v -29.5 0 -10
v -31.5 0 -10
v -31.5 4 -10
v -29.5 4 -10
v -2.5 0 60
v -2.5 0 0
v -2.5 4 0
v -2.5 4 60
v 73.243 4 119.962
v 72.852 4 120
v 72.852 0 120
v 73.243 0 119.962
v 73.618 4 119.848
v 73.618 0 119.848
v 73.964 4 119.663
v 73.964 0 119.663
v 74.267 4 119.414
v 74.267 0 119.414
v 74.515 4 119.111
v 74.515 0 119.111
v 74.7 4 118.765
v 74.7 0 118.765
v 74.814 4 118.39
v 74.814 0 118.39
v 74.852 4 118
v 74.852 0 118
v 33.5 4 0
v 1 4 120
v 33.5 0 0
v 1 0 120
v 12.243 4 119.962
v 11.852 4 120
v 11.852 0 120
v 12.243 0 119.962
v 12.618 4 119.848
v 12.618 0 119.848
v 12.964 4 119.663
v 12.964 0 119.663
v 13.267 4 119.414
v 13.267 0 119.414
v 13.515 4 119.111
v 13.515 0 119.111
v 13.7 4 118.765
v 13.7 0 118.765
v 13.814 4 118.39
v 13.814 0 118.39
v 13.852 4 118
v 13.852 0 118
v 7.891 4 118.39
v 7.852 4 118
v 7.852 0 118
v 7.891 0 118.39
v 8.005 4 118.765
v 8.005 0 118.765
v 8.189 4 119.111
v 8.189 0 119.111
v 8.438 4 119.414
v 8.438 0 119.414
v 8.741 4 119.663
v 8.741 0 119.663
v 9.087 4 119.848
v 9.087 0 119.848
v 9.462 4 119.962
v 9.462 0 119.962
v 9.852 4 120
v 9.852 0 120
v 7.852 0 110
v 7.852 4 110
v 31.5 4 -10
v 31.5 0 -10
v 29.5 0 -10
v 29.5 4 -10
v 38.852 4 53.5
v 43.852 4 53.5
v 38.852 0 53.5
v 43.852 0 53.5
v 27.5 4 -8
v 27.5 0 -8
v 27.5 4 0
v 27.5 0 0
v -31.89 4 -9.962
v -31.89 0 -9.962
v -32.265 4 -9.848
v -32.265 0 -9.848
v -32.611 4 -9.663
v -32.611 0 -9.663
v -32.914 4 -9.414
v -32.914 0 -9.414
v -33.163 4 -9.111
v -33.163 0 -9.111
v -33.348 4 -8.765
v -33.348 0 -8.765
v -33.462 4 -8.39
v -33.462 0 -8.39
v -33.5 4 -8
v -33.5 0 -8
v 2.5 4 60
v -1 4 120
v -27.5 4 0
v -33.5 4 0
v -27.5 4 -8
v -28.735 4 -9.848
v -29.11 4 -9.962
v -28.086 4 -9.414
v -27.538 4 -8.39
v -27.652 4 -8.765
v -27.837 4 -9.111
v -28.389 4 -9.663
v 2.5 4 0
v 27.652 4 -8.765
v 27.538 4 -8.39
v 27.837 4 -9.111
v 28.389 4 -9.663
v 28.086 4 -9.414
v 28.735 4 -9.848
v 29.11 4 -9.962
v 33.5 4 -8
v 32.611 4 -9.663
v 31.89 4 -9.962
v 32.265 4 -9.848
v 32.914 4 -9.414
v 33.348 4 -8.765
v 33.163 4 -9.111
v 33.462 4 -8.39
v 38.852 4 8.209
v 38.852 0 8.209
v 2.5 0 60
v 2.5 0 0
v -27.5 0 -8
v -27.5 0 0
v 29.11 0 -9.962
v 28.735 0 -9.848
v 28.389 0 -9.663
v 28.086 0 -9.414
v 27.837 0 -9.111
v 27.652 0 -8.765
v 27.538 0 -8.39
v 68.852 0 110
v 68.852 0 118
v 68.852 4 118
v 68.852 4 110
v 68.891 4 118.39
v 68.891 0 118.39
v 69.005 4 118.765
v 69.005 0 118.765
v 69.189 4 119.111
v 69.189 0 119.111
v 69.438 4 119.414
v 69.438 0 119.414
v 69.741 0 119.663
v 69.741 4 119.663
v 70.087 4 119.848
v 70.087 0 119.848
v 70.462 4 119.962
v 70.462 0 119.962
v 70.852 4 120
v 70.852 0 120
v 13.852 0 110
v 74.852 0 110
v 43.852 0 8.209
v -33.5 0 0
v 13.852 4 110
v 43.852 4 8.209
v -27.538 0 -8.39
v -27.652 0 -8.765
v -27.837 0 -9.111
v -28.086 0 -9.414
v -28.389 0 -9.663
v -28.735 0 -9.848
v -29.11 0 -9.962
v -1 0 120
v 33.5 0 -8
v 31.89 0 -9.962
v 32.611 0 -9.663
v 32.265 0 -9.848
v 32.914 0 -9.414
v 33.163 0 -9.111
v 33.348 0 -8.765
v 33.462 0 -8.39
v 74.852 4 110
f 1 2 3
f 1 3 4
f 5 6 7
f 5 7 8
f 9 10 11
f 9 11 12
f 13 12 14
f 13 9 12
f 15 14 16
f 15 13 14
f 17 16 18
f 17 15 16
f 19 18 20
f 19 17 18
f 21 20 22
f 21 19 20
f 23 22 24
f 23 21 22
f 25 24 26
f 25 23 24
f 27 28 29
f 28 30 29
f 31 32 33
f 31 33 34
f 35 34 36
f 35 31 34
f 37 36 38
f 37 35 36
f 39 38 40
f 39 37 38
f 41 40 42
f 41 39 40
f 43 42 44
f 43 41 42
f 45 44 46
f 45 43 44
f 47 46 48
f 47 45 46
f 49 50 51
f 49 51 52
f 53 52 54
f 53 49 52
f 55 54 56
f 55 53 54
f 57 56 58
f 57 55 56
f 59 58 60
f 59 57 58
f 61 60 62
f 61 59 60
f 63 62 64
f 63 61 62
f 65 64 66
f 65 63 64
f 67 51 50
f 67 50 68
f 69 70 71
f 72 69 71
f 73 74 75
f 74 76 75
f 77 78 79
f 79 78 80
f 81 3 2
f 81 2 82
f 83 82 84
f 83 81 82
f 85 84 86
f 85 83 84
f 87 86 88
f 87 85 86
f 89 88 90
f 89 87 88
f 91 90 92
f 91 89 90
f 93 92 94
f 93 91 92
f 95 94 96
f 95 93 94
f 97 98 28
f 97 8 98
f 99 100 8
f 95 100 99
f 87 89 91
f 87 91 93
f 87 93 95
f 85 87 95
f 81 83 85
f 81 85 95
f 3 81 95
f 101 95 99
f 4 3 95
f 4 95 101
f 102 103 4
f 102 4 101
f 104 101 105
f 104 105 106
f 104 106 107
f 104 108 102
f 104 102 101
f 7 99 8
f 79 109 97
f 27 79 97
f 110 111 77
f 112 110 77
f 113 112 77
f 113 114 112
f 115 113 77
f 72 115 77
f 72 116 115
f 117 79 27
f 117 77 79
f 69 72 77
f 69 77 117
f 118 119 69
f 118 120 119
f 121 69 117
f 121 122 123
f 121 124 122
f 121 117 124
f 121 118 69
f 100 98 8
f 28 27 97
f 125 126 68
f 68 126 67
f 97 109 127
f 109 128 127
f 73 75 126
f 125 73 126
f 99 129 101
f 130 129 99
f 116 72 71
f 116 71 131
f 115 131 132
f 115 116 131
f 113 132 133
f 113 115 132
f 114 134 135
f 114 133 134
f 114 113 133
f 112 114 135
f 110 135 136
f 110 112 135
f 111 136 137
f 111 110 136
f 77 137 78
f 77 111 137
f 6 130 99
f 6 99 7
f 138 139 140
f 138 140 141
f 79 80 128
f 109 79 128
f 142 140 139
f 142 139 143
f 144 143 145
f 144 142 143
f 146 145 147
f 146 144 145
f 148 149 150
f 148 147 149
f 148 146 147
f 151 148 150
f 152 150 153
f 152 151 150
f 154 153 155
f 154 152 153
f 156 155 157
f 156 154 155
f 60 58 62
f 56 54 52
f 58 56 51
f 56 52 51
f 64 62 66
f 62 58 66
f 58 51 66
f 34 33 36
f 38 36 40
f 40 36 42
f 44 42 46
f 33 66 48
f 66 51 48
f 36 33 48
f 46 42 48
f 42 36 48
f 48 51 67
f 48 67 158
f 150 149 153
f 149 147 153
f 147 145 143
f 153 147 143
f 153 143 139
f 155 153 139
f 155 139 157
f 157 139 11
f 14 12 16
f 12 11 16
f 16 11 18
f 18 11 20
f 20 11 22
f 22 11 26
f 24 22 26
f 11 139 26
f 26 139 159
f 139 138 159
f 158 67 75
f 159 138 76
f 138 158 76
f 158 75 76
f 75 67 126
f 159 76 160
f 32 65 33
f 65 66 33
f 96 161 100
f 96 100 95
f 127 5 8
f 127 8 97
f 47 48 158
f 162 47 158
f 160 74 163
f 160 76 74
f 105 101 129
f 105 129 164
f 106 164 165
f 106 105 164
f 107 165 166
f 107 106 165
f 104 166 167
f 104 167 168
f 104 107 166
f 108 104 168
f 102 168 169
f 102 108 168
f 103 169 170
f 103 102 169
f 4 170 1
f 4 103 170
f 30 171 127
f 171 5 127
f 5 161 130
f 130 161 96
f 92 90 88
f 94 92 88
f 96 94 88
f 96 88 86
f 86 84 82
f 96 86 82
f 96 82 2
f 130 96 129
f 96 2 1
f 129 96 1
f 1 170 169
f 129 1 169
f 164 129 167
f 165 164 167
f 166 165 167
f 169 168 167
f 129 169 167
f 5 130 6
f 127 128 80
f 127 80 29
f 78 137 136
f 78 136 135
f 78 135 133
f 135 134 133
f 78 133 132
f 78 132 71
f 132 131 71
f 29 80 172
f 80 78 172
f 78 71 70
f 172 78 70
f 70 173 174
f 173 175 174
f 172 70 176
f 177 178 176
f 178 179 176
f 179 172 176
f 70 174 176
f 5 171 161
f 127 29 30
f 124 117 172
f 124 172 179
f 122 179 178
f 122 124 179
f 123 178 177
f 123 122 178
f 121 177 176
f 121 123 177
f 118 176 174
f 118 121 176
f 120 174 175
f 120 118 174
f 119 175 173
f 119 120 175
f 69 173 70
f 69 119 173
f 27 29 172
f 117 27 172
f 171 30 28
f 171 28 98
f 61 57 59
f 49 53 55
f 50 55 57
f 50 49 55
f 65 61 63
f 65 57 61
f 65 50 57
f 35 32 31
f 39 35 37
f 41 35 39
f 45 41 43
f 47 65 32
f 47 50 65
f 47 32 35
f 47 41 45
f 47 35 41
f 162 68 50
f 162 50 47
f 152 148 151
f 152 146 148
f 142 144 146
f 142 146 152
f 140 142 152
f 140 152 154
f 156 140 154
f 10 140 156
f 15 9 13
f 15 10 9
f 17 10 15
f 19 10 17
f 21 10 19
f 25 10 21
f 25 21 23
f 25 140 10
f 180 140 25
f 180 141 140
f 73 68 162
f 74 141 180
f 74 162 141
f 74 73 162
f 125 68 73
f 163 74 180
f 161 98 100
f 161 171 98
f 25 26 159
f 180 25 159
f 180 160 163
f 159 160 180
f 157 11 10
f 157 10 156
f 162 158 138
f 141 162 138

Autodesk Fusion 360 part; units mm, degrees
sketch "Skizze1" plane through (0, 0, 0) normal (0, 1, 0) x (1, 0, 0)
  line L0 (-27.5, 0) -> (0, 0)
  line L1 (0, 0) -> (0, -120)
  line L2 (0, -120) -> (-1, -120)
  line L3 (-1, -120) -> (-33.5, 0)
  line L4 (-33.5, 0) -> (-33.5, 10)
  line L5 (-33.5, 10) -> (-27.5, 10)
  line L6 (-27.5, 10) -> (-27.5, 0)
  line L7 (0, 0) -> (-2.5, 0)
  line L8 (-2.5, 0) -> (-2.5, -60)
  line L9 (-2.5, -60) -> (0, -60)
  line L10 (0, -60) -> (0, 0)
  line L11 (2.5, -60) -> (0, -60)
  line L12 (0, 0) -> (2.5, 0)
  line L13 (0, -120) -> (1, -120)
  line L14 (33.5, 0) -> (33.5, 10)
  line L15 (33.5, 10) -> (27.5, 10)
  line L16 (2.5, 0) -> (2.5, -60)
  line L17 (0, 0) -> (0, -120)
  line L18 (27.5, 10) -> (27.5, 0)
  line L19 (1, -120) -> (33.5, 0)
  line L20 (27.5, 0) -> (0, 0)
  line L21 (7.8524, -120) -> (7.8524, -110)
  line L22 (7.8524, -120) -> (13.8524, -120)
  line L23 (13.8524, -120) -> (13.8524, -110)
  line L24 (13.8524, -110) -> (41.3524, -110)
  line L25 (41.3524, -110) -> (41.3524, 0)
  line L26 (41.3524, 0) -> (7.8524, -110)
  line L27 (41.3524, -53.5) -> (38.8524, -53.5)
  line L28 (38.8524, -53.5) -> (38.8524, -8.209)
  line L29 (41.3524, 0) -> (74.8524, -110)
  line L30 (74.8524, -120) -> (74.8524, -110)
  line L31 (74.8524, -120) -> (68.8524, -120)
  line L32 (68.8524, -120) -> (68.8524, -110)
  line L33 (68.8524, -110) -> (41.3524, -110)
  line L34 (43.8524, -53.5) -> (43.8524, -8.209)
  line L35 (41.3524, -53.5) -> (43.8524, -53.5)
  dimension "d1" = 6
  dimension "d3" = 1
  dimension "d5" = 10
  dimension "d6" = 60
  dimension "d7" = 2.5
  dimension "d15" = 56.5
  dimension "d20" = 4
  dimension "d22" = 120
  dimension "d25" = 55
extrude "Extrusion1" add sketch "Skizze1" along normal blind 4 contours L0 L1 L2 L3 L4 L5 L6 L8 L9 L17 | L1 L11 L13 L14 L15 L16 L17 L18 L19 L20 | L21 L22 L23 L24 L25 L26 L27 L28 | L25 L29 L30 L31 L32 L33 L34 L35 makes body 1 at (-10.8333, 0, 20) makes body 2 at (41.3524, 0, 91.1667)
fillet "Abrundung1" radius 2 8 edges at (33.5, 2, -10) (27.5, 2, -10) (-27.5, 2, -10) (-33.5, 2, -10) (7.8524, 2, 120) (13.8524, 2, 120) (68.8524, 2, 120) (74.8524, 2, 120) on bodies 1 2
equation "d6 = d22 / 2"
equation "d15 = d6 - 3.5 mm"
